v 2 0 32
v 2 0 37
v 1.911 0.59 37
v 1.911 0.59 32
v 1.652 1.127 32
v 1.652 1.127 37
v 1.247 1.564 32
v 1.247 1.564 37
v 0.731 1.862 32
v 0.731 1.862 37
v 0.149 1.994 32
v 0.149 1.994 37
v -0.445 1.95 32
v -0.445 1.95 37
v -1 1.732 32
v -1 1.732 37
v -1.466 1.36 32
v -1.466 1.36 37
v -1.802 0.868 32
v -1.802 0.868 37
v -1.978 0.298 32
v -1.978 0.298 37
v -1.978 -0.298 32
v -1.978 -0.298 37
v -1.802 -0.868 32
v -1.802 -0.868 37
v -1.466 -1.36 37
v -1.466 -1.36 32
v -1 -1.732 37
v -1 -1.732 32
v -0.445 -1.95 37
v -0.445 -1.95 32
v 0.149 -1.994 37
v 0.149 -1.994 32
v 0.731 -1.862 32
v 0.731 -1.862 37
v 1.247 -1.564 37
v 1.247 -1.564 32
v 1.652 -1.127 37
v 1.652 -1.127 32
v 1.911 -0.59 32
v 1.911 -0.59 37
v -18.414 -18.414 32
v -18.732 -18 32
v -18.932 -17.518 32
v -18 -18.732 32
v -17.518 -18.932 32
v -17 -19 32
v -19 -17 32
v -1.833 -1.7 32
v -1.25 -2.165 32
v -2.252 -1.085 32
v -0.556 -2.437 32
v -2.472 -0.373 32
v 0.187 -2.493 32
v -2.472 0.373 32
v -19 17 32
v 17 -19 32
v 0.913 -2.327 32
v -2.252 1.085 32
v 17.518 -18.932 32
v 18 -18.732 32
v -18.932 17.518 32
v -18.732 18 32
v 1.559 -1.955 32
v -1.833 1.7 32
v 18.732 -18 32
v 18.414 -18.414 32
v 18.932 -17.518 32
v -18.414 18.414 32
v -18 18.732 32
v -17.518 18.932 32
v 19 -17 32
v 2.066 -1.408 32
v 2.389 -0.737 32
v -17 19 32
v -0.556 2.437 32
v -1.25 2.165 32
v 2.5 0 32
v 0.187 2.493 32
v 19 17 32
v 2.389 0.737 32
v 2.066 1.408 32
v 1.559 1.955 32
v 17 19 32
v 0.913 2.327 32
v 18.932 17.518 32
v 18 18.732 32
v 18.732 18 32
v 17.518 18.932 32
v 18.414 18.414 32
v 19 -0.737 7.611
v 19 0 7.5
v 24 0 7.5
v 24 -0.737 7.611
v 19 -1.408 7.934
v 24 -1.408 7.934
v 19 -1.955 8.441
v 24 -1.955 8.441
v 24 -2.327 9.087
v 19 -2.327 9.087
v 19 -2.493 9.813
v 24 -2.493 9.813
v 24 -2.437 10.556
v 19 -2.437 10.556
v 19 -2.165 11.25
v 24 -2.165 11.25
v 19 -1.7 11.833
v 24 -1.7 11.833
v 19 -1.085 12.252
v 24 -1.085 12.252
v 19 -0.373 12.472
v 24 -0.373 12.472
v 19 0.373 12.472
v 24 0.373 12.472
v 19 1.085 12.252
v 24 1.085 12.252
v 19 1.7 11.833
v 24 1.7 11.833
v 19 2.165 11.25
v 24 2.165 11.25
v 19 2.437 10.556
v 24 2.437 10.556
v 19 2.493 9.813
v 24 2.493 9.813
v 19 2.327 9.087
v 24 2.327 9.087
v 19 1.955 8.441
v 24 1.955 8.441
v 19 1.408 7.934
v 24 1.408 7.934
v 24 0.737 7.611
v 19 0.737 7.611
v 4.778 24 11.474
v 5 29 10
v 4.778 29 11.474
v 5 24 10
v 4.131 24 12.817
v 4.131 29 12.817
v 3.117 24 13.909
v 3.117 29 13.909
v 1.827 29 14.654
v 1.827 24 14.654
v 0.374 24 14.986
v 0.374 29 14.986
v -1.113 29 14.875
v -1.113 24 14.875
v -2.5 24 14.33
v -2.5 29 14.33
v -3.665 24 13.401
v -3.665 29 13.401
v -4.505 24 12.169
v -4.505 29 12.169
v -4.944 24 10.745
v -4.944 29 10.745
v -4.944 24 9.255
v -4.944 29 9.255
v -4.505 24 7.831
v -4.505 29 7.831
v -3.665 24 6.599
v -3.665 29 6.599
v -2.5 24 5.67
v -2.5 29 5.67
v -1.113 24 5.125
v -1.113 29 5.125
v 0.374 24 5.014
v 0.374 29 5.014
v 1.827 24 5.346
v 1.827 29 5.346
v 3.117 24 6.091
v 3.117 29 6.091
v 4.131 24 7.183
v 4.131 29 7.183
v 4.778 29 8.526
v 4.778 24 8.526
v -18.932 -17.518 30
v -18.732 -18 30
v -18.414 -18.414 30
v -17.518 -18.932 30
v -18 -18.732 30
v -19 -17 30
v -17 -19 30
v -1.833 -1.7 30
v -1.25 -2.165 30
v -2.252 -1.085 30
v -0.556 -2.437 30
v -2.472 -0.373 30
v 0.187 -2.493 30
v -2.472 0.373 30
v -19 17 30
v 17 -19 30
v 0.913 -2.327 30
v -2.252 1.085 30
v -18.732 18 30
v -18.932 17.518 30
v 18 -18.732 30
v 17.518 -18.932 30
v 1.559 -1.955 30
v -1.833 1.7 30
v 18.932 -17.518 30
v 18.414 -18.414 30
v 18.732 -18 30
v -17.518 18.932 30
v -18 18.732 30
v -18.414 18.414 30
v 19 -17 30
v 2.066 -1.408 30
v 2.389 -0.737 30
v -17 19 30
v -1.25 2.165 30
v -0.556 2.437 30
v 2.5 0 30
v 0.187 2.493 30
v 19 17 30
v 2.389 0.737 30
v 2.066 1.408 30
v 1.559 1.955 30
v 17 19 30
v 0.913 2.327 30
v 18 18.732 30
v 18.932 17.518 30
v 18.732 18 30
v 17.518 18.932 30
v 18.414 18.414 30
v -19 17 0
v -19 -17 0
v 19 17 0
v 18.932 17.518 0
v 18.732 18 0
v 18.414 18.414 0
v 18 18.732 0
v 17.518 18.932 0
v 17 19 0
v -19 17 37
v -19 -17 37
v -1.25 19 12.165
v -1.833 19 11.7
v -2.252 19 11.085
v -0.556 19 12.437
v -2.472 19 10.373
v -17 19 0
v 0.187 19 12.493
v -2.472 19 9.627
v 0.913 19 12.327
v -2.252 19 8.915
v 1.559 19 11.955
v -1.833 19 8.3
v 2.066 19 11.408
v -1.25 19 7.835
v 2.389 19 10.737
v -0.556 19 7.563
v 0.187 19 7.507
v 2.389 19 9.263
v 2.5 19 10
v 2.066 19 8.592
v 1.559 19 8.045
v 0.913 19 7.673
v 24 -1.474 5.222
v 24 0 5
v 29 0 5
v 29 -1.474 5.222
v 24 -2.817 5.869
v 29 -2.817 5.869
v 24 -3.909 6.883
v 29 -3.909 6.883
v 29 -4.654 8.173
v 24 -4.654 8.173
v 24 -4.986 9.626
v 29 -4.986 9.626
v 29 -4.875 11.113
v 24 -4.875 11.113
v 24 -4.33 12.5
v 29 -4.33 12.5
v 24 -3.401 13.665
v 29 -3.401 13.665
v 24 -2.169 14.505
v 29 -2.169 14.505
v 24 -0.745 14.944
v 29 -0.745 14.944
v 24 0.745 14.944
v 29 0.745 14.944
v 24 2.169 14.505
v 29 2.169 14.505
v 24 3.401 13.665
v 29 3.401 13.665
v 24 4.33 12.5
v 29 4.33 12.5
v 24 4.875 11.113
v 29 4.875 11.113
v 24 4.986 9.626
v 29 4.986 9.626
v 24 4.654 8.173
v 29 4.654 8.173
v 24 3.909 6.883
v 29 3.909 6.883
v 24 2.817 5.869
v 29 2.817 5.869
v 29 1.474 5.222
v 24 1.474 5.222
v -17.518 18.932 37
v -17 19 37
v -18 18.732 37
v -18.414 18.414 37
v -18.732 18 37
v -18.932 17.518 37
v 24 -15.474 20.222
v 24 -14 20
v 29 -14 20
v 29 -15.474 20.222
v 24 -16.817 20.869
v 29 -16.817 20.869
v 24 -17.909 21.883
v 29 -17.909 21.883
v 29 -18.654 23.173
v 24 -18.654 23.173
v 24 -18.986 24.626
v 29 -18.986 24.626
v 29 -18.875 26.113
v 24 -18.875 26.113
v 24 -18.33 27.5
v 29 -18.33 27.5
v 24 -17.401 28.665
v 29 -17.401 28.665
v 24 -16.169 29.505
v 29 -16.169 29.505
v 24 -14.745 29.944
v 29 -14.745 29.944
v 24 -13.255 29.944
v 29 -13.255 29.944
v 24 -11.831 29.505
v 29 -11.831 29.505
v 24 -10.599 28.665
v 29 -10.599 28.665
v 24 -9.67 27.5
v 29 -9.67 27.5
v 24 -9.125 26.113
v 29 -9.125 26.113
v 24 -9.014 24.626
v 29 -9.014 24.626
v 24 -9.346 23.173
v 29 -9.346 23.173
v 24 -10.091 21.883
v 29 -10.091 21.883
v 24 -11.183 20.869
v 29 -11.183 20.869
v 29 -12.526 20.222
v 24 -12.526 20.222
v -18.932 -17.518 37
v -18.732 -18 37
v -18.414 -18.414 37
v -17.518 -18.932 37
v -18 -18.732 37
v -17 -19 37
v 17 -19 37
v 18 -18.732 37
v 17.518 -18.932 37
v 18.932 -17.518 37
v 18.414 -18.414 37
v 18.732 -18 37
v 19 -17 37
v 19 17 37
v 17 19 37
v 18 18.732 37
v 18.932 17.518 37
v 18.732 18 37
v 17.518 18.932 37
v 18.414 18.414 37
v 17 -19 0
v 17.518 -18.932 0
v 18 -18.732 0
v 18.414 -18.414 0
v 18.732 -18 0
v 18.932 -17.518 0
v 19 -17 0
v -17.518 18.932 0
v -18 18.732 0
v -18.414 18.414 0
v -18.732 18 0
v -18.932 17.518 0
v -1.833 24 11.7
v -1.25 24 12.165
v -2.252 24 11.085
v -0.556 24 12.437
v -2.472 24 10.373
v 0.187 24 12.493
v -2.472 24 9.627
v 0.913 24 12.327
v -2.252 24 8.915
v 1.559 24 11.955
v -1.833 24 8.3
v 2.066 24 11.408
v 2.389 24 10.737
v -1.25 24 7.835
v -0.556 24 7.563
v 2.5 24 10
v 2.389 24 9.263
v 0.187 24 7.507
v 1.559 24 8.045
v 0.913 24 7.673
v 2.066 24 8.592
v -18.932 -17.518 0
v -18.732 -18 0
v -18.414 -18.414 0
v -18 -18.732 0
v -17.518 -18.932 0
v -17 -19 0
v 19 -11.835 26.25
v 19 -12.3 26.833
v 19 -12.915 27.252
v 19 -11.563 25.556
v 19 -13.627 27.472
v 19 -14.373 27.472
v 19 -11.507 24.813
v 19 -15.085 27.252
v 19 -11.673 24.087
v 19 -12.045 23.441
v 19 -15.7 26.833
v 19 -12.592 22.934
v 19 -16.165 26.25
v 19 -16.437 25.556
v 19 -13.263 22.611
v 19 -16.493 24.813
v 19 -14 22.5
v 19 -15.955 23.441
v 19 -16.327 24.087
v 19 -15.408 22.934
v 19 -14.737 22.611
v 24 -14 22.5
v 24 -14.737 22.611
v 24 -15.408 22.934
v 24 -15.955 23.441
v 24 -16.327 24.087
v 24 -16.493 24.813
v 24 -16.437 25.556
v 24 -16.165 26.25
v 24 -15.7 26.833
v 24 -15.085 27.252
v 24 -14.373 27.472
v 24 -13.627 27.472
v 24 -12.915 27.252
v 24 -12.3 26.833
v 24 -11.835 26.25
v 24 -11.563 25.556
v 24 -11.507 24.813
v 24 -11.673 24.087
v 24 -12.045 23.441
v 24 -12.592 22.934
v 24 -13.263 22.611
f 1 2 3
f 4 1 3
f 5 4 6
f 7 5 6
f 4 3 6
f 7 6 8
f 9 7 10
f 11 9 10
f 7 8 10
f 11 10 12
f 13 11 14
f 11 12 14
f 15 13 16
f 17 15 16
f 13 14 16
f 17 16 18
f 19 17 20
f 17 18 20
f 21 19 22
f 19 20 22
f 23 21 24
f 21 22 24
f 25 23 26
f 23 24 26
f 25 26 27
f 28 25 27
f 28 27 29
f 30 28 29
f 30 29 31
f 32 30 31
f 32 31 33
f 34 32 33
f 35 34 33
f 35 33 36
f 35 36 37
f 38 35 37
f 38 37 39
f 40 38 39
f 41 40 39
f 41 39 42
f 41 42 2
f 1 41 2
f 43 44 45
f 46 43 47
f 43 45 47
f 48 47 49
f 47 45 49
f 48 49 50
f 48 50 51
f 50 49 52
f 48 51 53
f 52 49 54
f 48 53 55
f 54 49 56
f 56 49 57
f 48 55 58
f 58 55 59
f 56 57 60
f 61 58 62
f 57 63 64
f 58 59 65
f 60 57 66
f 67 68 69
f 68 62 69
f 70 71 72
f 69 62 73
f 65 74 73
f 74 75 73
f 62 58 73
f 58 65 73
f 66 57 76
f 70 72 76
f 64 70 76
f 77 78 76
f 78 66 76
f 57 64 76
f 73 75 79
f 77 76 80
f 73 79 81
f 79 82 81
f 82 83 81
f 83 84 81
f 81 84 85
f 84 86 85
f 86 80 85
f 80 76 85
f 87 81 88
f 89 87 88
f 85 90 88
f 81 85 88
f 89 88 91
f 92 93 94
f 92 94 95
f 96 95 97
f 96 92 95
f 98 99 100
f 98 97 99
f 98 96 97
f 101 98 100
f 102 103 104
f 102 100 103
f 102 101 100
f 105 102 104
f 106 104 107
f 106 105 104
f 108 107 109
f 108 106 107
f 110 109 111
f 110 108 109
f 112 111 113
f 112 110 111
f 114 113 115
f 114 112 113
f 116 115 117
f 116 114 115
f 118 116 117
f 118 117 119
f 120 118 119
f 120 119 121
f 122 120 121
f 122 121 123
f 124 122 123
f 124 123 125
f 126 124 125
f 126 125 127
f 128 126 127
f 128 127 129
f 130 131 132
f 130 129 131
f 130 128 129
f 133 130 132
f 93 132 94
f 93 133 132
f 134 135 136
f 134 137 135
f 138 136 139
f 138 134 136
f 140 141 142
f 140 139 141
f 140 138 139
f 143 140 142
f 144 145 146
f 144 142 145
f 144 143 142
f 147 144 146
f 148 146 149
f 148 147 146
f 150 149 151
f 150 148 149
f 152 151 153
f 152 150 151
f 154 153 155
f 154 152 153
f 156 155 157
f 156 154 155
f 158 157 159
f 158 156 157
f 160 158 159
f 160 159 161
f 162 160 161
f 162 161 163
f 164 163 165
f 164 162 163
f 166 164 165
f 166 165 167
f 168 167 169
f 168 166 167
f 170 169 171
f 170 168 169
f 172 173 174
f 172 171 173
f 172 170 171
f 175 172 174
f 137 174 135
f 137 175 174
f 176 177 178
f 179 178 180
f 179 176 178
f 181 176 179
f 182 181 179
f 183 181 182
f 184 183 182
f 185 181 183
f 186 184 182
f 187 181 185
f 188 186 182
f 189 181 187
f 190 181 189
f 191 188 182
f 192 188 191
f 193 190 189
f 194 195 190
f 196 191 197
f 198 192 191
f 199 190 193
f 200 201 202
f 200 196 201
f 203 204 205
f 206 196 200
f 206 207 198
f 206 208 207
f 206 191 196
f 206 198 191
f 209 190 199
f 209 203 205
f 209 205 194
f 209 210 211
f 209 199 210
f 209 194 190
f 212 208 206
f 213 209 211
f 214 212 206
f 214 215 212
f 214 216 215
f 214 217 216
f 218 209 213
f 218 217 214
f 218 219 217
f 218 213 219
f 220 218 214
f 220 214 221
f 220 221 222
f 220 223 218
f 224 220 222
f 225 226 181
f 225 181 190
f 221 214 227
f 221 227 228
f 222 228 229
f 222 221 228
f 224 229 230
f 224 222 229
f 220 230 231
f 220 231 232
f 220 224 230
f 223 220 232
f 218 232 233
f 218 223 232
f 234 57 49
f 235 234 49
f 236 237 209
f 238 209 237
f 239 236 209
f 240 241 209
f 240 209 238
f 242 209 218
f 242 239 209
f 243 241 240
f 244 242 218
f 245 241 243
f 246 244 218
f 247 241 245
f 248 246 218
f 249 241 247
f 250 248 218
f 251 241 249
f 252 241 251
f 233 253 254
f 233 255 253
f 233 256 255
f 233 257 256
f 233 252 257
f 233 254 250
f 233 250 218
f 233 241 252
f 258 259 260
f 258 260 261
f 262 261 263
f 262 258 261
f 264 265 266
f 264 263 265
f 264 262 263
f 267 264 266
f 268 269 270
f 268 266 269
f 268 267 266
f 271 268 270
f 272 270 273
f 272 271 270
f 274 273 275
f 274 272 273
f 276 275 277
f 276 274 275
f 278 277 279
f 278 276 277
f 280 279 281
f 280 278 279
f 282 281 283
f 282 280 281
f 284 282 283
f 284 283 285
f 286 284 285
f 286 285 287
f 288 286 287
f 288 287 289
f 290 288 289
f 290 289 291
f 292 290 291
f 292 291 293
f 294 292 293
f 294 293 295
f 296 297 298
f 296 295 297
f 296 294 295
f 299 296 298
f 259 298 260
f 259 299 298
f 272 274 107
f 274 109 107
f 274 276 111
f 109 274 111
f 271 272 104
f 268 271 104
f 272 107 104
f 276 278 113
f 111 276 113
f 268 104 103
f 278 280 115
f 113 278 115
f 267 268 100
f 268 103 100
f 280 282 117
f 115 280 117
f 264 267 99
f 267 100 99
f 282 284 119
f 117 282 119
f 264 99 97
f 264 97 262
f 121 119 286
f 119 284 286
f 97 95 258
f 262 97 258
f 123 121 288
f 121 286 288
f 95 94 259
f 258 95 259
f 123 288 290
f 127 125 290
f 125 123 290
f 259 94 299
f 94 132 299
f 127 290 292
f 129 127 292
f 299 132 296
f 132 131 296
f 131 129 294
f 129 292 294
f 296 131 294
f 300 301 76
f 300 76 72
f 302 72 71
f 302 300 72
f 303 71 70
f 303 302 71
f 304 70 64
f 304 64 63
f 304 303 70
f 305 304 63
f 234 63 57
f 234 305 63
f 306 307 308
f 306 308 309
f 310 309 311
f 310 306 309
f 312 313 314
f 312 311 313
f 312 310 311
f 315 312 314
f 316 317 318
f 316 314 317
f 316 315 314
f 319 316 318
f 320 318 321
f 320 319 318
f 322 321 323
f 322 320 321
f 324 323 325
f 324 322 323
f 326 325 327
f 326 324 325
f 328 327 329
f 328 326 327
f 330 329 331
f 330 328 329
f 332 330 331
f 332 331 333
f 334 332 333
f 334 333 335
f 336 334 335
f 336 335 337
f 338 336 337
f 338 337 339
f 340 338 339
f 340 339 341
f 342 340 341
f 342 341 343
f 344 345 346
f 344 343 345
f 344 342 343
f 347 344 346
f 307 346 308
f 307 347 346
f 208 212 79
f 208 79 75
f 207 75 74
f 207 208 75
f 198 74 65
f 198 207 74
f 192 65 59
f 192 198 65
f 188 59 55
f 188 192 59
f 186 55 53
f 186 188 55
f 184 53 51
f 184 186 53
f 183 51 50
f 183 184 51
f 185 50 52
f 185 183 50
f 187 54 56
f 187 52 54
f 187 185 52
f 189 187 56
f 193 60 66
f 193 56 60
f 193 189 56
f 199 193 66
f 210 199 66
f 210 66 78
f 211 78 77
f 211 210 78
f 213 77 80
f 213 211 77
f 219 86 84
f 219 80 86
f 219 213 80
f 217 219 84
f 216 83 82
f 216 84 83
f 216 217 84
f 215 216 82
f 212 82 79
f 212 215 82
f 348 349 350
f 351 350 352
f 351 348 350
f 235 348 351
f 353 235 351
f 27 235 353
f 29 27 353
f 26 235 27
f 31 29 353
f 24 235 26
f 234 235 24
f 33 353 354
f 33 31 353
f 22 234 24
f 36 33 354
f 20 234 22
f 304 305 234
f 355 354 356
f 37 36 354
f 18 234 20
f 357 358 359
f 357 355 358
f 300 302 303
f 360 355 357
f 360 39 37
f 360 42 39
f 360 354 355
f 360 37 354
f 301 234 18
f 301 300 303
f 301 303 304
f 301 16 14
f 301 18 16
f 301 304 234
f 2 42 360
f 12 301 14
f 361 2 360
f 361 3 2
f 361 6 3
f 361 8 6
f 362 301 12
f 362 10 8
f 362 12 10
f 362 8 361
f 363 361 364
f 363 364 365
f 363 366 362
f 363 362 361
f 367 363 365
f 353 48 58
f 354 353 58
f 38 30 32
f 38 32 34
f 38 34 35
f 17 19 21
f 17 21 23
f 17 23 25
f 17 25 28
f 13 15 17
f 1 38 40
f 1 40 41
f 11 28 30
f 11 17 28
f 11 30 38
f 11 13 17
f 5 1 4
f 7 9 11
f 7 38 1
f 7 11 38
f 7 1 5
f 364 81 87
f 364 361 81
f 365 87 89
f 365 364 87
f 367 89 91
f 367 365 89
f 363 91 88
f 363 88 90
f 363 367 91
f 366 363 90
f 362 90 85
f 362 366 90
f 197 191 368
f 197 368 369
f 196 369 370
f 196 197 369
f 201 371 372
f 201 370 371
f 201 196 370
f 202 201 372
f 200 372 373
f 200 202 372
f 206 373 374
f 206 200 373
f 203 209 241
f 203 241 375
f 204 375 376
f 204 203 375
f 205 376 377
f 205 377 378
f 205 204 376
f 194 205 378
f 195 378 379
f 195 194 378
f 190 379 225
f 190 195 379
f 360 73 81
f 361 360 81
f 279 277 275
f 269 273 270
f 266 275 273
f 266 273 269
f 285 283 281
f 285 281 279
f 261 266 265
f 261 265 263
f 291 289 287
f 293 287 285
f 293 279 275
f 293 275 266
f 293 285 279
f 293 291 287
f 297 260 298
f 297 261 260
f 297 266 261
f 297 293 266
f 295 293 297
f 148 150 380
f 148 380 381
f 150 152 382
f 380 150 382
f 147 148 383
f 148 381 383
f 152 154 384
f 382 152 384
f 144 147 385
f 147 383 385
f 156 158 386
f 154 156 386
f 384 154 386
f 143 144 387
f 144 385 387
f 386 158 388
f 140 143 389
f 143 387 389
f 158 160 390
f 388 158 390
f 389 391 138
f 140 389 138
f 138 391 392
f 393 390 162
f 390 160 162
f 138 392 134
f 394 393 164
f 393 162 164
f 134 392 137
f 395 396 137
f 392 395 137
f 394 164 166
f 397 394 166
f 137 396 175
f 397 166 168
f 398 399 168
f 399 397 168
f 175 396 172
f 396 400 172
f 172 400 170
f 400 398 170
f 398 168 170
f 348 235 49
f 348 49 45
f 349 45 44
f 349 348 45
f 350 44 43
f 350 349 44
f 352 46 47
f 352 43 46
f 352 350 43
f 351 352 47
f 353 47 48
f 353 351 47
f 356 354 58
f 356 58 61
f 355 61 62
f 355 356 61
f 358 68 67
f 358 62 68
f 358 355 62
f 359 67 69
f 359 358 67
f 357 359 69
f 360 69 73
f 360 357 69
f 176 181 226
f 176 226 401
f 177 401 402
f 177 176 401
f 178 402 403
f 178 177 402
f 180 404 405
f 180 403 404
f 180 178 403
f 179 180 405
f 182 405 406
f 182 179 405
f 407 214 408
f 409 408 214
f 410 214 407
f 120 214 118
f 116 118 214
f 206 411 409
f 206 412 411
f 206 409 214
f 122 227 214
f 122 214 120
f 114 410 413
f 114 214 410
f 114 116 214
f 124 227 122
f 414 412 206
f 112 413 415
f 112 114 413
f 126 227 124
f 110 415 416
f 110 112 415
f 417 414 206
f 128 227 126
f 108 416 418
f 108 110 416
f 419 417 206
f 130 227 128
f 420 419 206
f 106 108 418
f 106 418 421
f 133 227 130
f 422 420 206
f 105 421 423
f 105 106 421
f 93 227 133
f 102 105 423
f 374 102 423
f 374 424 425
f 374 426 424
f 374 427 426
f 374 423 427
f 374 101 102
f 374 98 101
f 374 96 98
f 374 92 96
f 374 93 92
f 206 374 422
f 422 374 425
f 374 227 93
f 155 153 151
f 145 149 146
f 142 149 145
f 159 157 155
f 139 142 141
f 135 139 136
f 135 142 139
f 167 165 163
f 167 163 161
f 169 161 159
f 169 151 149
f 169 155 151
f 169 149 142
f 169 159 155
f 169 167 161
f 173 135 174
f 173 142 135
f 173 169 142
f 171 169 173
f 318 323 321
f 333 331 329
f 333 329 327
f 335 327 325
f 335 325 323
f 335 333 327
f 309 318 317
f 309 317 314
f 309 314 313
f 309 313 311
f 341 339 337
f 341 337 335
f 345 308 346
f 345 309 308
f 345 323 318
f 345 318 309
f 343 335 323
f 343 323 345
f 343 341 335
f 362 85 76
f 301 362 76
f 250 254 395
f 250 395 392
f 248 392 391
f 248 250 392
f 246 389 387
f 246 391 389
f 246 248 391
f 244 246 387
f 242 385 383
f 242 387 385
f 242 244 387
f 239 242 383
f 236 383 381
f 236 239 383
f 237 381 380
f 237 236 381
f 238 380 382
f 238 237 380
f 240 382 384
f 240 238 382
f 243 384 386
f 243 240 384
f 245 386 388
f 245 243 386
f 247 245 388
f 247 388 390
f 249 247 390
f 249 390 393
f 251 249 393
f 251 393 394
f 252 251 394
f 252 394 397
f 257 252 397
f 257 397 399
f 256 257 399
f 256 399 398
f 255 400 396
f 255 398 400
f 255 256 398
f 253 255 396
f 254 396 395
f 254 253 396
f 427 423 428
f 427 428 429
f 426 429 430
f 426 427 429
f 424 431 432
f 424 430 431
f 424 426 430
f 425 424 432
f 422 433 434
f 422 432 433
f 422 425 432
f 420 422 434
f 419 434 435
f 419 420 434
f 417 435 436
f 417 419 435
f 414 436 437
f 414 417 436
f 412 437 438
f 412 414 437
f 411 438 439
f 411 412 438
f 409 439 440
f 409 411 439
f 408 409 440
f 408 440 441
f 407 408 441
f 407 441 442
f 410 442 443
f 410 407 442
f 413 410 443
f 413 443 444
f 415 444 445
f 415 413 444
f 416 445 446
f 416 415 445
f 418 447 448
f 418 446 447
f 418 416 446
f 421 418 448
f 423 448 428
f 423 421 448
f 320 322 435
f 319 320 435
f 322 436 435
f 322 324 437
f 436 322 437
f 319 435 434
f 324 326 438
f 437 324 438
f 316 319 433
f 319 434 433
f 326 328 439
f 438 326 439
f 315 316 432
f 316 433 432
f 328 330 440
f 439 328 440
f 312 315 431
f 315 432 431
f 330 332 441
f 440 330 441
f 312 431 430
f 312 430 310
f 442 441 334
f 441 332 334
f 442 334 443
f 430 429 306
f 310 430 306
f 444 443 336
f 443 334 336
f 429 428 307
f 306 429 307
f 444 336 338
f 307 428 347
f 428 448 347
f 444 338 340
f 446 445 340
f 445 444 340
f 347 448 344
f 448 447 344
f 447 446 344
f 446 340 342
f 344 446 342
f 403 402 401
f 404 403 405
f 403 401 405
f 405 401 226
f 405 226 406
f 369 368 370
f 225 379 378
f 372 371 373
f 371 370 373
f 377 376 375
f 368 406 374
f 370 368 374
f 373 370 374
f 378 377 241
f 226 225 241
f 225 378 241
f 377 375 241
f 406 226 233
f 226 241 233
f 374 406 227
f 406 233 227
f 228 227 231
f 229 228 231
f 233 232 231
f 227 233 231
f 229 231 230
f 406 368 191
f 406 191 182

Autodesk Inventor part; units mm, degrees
ref_plane "YZ Plane" through (0, 0, 0) normal (1, 0, 0) x (0, 1, 0)
ref_plane "XZ Plane" through (0, 0, 0) normal (0, 1, 0) x (-1, 0, 0)
ref_plane "XY Plane" through (0, 0, 0) normal (0, 0, 1) x (1, 0, 0)
sketch "Sketch1" plane through (0, 0, 0) normal (0, 0, 1) x (1, 0, 0)
  line L0 (19, -19) -> (-19, -19)
  line L1 (-19, -19) -> (-19, 19)
  line L2 (-19, 19) -> (19, 19)
  line L3 (19, 19) -> (19, -19)
  line L4 (19, -19) -> (-19, 19) construction
  line L5 (-19, -19) -> (19, 19) construction
  point P0 (0, 0)
  dimension "d0" = 38
  dimension "d1" = 38
extrude "Extrusion1" add sketch "Sketch1" along normal blind 30
sketch "Sketch2" plane through (0, 0, 30) normal (0, 0, 1) x (1, 0, 0)
  circle A0 centre (0, 0) radius 2.5
  dimension "d4" = 5
extrude "Extrusion2" add sketch "Sketch2" along normal blind 2
sketch "Sketch3" plane through (0, 0, 32) normal (0, 0, 1) x (1, 0, 0)
  line L0 (19, 19) -> (-19, 19) projected
  line L1 (-19, 19) -> (-19, -19) projected
  line L2 (-19, -19) -> (19, -19) projected
  line L3 (19, -19) -> (19, 19) projected
  point P0 (0, 0)
extrude "Extrusion3" add sketch "Sketch3" along normal blind 5
sketch "Sketch4" plane through (-19, 19, 0) normal (0, 1, 0) x (1, 0, 0)
  circle A0 centre (19, -10) radius 2.5
  point P0 (19, 0)
  dimension "d9" = 5
extrude "Extrusion4" add sketch "Sketch4" along normal blind 5
sketch "Sketch5" plane through (0, 24, 10) normal (0, 1, 0) x (1, 0, 0)
  circle A0 centre (0, 0) radius 5
  point P0 (0, 10)
  dimension "d12" = 10
extrude "Extrusion5" add sketch "Sketch5" along normal blind 5
sketch "Sketch6" plane through (19, -19, 0) normal (1, 0, 0) x (0, 0, -1)
  circle A0 centre (-10, 19) radius 2.5
  circle A1 centre (-25, 5) radius 2.5
  point P0 (0, 19)
  dimension "d15" = 5
  dimension "d16" = 5
extrude "Extrusion6" add sketch "Sketch6" along normal blind 5
sketch "Sketch7" plane through (24, 0, 10) normal (1, 0, 0) x (0, 0, -1)
  circle A0 centre (0, 0) radius 5
  circle A1 centre (-15, -14) radius 2.5 projected
  circle A2 centre (-15, -14) radius 5
  point P0 (10, 0)
  dimension "d19" = 10
  dimension "d20" = 10
extrude "Extrusion7" add sketch "Sketch7" along normal blind 5 contours A0 | A1 | A2
fillet "Fillet1" radius 2 8 edges at (19, 19, 15) (19, 19, 34.5) (19, -19, 15) (-19, 19, 15) (19, -19, 34.5) (-19, -19, 15) (-19, -19, 34.5) (-19, 19, 34.5)
sketch "Sketch8" plane through (0, 0, 37) normal (0, 0, 1) x (1, 0, 0)
  circle A0 centre (0, 0) radius 2
  dimension "d24" = 4
extrude "Extrusion8" cut sketch "Sketch8" against normal blind 5
properties part number "RadiantDyes-RD-PDT-S(appox)"
